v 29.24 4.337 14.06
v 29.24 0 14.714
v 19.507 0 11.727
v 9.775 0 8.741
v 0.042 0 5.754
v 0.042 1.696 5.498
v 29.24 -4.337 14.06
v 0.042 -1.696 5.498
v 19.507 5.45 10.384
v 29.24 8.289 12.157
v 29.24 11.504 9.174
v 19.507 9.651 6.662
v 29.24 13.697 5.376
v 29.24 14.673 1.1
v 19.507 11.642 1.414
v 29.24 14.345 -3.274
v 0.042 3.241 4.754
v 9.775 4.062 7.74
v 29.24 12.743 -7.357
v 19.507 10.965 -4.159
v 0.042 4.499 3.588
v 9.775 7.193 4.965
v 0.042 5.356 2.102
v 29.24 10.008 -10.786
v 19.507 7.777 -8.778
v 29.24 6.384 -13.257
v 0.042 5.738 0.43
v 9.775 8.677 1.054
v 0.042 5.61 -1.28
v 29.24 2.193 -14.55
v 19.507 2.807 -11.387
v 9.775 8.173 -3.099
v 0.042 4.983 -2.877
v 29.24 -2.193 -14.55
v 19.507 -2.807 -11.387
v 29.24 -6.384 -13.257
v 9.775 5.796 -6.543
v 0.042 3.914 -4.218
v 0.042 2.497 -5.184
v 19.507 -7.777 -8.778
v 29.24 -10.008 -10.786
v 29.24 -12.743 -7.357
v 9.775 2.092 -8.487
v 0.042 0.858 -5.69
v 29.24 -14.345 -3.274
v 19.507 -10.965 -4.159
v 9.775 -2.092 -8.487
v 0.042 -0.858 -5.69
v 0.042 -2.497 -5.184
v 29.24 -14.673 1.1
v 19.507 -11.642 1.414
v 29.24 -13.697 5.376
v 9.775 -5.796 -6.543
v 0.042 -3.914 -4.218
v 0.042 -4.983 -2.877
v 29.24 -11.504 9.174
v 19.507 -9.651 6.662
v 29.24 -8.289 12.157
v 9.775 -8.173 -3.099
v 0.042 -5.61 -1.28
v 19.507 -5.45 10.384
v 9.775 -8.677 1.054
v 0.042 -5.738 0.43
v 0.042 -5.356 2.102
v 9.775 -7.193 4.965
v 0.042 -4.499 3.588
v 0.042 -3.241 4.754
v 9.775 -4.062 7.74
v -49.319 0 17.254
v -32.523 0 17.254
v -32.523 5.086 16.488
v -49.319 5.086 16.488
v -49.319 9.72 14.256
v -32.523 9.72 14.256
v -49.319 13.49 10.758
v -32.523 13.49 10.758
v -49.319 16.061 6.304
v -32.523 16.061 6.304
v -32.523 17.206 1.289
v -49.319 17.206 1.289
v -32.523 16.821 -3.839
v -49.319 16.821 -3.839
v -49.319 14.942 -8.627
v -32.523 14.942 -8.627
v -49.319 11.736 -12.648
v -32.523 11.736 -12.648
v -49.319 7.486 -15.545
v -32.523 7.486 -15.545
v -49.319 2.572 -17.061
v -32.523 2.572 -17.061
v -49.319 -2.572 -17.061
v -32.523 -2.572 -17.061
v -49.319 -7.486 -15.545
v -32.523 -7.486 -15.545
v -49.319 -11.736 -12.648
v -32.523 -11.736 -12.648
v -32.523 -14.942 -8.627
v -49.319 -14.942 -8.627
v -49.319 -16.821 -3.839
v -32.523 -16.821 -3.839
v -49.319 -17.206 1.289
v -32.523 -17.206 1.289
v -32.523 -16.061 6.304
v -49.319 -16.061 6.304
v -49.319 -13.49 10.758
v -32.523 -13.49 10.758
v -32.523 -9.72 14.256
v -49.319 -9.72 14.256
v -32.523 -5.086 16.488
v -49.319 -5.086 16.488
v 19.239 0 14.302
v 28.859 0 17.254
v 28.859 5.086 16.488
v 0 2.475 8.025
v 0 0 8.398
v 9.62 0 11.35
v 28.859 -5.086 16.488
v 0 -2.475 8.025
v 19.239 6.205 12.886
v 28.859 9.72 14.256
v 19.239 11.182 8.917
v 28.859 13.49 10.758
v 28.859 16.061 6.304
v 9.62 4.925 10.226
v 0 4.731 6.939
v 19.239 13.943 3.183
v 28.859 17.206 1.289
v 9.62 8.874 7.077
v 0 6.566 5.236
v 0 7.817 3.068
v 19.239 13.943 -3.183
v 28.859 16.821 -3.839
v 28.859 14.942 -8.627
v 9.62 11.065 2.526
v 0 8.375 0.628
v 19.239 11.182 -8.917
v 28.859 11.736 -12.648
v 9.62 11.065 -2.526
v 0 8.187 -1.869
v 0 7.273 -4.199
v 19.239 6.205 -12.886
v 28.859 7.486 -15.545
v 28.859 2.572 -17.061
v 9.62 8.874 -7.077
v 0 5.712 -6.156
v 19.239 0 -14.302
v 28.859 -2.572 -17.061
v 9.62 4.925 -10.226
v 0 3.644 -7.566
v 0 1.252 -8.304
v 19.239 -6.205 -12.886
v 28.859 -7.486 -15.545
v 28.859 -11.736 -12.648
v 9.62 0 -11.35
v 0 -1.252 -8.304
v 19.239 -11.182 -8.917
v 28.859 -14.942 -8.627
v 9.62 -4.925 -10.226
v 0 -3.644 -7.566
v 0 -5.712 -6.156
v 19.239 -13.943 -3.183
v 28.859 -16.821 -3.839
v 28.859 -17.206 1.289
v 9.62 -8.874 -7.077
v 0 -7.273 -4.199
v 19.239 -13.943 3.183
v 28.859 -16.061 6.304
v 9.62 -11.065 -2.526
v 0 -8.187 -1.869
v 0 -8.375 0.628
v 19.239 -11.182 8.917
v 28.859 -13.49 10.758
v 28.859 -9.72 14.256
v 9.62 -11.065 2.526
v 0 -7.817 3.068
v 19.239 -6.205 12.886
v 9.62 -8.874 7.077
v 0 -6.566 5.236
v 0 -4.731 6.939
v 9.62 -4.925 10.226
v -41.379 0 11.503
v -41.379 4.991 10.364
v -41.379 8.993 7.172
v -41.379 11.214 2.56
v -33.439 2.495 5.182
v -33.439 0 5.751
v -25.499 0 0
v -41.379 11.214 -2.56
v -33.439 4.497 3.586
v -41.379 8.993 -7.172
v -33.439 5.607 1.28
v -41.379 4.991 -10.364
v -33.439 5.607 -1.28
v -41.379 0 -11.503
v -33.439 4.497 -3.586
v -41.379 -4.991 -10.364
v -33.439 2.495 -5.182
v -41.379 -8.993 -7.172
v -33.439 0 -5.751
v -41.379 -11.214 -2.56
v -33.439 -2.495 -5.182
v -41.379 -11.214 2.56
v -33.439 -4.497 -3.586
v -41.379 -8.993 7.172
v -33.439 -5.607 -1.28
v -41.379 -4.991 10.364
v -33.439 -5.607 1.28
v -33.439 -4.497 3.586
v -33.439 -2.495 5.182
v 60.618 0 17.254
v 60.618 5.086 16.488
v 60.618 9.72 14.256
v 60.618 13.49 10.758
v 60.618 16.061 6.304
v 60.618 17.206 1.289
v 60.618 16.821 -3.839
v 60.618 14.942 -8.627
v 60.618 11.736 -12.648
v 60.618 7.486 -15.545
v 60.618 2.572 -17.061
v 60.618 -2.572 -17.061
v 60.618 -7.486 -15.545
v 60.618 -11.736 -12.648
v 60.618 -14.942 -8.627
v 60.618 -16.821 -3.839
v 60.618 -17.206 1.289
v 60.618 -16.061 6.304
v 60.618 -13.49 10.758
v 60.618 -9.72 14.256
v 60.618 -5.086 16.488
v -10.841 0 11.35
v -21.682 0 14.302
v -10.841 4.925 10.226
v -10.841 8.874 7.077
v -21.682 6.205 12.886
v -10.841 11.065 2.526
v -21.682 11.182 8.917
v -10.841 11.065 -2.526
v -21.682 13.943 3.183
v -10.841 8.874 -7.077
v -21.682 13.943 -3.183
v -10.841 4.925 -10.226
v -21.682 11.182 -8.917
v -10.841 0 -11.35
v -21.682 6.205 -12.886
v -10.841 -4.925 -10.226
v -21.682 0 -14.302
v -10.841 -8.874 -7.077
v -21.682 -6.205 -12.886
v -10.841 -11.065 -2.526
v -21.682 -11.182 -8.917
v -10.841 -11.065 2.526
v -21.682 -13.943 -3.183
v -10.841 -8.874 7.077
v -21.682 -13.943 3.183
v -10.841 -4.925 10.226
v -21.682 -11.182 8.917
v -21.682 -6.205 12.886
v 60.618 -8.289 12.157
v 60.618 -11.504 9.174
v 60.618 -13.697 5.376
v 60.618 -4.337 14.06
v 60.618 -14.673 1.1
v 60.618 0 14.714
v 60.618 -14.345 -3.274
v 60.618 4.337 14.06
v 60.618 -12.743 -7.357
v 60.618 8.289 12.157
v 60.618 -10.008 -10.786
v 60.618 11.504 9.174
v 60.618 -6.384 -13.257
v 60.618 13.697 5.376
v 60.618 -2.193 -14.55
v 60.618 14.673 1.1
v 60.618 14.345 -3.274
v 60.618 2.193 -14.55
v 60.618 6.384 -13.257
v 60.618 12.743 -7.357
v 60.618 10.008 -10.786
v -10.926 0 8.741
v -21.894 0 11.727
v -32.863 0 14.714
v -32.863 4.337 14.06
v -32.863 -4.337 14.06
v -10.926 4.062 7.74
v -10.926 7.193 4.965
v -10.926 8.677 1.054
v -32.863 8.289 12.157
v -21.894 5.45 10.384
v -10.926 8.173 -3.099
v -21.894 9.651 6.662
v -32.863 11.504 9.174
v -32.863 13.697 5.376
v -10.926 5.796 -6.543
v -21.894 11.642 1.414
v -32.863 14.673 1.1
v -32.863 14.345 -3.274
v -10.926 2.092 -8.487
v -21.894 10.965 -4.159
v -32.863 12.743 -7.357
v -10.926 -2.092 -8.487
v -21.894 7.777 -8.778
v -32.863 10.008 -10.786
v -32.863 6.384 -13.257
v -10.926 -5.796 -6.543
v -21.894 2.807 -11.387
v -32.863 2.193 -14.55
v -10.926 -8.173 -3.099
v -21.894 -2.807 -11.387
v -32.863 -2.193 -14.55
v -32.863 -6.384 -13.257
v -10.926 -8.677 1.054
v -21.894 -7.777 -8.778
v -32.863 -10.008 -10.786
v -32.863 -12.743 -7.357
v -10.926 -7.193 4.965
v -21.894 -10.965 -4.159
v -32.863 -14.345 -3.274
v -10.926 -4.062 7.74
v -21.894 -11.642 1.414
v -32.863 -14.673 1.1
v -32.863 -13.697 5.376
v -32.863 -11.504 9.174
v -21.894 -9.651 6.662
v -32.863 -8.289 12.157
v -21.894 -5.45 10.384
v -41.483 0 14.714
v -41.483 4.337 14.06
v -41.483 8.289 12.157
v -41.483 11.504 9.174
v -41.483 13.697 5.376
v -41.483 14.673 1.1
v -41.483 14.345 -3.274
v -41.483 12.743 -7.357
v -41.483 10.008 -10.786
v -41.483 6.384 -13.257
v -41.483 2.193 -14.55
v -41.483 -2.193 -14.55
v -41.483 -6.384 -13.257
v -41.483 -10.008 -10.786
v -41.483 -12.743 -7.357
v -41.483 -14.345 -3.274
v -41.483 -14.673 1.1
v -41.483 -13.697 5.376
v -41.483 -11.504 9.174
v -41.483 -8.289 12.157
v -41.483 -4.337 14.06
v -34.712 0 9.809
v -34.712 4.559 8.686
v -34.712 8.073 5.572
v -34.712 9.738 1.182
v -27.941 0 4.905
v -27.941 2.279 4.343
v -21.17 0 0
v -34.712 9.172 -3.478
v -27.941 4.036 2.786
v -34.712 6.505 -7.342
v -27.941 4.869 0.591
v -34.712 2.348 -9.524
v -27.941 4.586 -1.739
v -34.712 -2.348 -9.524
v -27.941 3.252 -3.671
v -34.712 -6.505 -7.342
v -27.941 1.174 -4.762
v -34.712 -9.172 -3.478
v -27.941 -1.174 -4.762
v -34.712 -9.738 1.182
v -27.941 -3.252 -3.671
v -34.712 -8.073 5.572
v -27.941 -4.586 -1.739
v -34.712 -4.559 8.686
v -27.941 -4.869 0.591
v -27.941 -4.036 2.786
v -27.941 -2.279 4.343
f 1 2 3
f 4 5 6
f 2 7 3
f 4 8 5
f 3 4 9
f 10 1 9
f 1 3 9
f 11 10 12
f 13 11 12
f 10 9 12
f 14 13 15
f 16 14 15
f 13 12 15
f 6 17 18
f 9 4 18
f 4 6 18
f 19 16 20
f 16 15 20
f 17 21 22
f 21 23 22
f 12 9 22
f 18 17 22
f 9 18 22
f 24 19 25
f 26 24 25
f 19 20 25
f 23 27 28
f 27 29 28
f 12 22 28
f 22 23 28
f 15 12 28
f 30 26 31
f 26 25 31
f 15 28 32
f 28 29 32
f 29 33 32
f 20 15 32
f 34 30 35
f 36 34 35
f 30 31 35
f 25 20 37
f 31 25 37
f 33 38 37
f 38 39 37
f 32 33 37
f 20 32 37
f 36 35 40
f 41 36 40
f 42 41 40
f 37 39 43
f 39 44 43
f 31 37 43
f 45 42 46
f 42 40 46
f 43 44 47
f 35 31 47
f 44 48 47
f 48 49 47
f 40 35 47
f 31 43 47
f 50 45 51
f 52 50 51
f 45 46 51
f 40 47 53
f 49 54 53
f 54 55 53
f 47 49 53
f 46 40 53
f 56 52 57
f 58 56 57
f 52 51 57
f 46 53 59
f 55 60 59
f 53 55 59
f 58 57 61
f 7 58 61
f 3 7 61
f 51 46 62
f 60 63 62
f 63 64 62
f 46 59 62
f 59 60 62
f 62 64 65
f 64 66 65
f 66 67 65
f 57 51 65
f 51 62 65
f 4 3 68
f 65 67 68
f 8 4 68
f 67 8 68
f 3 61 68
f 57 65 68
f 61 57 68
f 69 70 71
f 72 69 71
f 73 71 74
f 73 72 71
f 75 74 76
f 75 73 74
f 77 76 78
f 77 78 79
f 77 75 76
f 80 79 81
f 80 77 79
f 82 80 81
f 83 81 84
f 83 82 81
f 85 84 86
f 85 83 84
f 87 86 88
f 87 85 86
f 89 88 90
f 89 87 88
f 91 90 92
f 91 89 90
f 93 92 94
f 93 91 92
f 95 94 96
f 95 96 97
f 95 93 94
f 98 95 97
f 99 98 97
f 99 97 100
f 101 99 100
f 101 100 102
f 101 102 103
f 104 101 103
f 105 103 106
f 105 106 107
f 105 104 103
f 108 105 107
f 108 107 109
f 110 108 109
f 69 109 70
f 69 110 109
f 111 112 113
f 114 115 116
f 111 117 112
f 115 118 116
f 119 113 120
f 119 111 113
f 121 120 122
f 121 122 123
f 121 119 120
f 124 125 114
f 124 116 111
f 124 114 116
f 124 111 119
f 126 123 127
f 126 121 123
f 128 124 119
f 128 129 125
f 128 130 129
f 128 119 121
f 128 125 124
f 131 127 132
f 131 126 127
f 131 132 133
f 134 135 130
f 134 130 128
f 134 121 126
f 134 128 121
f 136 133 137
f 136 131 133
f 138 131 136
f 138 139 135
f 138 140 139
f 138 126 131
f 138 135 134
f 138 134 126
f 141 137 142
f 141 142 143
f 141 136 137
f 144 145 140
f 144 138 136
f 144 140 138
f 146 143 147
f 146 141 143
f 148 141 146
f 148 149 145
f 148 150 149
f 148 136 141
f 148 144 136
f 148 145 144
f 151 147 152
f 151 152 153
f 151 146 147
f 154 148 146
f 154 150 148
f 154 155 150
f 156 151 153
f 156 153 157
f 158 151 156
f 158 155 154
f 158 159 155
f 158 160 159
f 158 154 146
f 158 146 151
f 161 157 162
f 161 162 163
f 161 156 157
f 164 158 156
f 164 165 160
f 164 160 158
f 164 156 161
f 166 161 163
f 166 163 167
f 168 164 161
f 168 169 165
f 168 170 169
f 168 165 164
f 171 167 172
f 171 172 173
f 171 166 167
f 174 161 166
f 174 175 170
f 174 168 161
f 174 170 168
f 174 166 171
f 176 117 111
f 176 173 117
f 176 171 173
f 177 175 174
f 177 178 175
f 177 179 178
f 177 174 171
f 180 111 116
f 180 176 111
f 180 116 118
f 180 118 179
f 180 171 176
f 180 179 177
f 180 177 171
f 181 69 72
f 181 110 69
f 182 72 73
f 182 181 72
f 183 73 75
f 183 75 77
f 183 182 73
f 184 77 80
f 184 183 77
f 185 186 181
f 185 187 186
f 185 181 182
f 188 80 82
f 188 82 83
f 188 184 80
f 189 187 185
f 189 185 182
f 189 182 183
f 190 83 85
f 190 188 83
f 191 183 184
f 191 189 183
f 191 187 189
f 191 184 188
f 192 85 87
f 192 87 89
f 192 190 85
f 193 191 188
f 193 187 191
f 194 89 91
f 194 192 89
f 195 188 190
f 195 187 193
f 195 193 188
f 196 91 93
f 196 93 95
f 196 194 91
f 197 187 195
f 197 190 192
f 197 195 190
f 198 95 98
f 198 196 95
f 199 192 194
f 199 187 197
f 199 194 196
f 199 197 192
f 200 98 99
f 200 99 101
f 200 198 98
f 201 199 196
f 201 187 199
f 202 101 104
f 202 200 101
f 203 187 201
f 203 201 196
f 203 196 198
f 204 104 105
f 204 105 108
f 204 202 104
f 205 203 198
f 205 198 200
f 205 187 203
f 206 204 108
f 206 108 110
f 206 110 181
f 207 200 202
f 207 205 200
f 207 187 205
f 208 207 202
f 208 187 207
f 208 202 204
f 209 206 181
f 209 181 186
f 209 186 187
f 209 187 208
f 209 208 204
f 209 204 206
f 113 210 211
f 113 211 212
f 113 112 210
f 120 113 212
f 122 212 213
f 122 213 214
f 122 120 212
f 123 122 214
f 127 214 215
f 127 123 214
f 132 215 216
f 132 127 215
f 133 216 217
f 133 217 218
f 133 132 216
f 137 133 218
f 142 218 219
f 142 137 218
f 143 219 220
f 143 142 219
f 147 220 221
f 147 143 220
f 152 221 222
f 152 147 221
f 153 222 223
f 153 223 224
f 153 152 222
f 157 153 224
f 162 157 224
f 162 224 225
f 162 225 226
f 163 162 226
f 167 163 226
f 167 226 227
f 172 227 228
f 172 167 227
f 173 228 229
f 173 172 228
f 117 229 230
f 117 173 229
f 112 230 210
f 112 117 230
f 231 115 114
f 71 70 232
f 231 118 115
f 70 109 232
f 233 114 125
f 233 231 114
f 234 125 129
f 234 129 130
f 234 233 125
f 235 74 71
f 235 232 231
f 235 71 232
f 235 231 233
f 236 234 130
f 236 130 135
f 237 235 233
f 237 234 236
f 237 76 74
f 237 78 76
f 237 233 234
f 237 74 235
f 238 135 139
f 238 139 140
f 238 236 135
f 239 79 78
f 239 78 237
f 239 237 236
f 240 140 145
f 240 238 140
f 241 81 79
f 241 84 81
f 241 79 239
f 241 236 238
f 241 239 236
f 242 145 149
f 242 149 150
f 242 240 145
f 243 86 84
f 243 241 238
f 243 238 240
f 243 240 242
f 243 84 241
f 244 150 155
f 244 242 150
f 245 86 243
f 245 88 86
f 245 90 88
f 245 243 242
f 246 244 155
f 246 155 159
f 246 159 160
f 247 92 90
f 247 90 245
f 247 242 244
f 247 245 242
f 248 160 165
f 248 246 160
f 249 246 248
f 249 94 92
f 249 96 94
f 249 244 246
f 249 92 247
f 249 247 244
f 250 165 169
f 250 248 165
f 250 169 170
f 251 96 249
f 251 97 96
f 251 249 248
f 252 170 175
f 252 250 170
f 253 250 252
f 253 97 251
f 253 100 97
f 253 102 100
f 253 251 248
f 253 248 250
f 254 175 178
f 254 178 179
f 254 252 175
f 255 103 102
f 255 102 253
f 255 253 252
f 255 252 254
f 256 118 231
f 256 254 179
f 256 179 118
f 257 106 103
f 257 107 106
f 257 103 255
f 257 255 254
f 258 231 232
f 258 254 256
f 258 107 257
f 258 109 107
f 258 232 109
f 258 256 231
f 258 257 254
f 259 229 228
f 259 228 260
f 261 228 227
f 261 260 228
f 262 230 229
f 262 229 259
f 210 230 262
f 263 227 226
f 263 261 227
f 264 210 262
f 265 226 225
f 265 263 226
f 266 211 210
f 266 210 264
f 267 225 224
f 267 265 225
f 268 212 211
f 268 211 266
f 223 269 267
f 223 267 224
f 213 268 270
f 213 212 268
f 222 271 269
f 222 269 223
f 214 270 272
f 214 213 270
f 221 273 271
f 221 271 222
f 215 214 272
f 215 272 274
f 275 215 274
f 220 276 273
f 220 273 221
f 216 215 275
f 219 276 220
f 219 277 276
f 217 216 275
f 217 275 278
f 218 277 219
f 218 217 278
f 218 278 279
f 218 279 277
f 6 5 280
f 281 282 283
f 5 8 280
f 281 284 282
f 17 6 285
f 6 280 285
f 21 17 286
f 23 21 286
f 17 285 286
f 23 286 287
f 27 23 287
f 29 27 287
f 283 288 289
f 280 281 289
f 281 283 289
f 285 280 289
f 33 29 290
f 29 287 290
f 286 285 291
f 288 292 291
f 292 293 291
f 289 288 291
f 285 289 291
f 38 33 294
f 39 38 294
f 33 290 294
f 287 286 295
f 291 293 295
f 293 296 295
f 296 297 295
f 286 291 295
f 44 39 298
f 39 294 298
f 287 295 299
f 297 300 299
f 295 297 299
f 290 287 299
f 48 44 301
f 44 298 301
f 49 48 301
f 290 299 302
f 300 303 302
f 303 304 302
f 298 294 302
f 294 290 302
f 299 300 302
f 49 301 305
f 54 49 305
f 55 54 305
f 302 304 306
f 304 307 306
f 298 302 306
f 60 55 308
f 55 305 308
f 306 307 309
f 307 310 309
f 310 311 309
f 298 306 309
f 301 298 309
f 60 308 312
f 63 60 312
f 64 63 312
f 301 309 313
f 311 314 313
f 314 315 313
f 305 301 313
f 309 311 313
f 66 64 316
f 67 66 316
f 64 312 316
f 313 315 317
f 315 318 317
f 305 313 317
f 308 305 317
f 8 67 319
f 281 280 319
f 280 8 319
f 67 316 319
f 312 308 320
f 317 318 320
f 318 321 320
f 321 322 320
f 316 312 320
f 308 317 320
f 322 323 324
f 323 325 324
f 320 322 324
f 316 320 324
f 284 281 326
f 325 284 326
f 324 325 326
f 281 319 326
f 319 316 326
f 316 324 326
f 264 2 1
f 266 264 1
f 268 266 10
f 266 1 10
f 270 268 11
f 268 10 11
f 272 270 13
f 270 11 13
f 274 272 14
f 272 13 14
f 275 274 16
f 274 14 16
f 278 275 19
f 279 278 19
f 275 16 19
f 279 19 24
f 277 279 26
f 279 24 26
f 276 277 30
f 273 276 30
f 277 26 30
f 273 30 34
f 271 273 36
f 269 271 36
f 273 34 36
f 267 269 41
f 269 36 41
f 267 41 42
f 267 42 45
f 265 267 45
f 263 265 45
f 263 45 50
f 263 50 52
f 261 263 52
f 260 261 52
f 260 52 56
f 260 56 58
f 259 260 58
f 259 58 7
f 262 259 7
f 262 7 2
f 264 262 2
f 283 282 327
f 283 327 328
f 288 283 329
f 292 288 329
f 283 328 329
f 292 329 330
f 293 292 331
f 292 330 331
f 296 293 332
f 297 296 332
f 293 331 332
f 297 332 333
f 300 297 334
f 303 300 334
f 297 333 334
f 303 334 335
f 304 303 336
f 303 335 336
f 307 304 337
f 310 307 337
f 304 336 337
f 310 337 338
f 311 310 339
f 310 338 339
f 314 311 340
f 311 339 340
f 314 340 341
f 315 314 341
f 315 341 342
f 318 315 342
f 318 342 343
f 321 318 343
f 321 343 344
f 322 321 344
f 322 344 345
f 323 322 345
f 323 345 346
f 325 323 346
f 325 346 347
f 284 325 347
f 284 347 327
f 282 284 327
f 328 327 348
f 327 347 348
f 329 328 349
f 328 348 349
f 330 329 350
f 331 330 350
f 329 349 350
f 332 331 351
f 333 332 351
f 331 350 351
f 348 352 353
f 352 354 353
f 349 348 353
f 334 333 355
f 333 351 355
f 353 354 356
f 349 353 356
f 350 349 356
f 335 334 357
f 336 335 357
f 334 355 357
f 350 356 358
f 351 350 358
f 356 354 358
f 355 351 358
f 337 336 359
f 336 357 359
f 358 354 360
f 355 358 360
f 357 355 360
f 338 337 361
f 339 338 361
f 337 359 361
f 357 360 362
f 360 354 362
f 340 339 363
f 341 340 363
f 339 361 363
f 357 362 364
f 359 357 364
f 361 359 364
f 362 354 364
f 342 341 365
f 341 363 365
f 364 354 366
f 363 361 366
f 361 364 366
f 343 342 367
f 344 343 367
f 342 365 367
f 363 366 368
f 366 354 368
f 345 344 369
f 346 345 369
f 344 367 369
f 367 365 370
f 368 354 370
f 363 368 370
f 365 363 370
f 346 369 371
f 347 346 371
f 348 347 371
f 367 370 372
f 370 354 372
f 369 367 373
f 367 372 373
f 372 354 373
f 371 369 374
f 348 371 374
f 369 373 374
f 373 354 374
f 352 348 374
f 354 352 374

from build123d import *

# Parameters (mm, degrees)
F2_T = -2.54


with BuildPart() as f1:
    # F0 (on Front) → F1 (revolve)
    with BuildSketch(Plane.XZ):
        Polygon((0, 8.3979964256), (-32.5231477618, 17.2540657222), (-49.3191406131, 17.2540657222), (-25.4993699491, 0), (60.6182664633, 0), (60.6182664633, 17.2540657222), (28.8585666567, 17.2540657222), align=None)
    revolve(axis=Axis((17.5594482571, 0, 0), (-1, 0, 0)))

    # F2
    f2_openings = [f1.faces().sort_by_distance(p)[0] for p in [
        (60.618266, 0, 0),
    ]]
    offset(amount=F2_T, openings=f2_openings, kind=Kind.INTERSECTION)


solid = f1.part
